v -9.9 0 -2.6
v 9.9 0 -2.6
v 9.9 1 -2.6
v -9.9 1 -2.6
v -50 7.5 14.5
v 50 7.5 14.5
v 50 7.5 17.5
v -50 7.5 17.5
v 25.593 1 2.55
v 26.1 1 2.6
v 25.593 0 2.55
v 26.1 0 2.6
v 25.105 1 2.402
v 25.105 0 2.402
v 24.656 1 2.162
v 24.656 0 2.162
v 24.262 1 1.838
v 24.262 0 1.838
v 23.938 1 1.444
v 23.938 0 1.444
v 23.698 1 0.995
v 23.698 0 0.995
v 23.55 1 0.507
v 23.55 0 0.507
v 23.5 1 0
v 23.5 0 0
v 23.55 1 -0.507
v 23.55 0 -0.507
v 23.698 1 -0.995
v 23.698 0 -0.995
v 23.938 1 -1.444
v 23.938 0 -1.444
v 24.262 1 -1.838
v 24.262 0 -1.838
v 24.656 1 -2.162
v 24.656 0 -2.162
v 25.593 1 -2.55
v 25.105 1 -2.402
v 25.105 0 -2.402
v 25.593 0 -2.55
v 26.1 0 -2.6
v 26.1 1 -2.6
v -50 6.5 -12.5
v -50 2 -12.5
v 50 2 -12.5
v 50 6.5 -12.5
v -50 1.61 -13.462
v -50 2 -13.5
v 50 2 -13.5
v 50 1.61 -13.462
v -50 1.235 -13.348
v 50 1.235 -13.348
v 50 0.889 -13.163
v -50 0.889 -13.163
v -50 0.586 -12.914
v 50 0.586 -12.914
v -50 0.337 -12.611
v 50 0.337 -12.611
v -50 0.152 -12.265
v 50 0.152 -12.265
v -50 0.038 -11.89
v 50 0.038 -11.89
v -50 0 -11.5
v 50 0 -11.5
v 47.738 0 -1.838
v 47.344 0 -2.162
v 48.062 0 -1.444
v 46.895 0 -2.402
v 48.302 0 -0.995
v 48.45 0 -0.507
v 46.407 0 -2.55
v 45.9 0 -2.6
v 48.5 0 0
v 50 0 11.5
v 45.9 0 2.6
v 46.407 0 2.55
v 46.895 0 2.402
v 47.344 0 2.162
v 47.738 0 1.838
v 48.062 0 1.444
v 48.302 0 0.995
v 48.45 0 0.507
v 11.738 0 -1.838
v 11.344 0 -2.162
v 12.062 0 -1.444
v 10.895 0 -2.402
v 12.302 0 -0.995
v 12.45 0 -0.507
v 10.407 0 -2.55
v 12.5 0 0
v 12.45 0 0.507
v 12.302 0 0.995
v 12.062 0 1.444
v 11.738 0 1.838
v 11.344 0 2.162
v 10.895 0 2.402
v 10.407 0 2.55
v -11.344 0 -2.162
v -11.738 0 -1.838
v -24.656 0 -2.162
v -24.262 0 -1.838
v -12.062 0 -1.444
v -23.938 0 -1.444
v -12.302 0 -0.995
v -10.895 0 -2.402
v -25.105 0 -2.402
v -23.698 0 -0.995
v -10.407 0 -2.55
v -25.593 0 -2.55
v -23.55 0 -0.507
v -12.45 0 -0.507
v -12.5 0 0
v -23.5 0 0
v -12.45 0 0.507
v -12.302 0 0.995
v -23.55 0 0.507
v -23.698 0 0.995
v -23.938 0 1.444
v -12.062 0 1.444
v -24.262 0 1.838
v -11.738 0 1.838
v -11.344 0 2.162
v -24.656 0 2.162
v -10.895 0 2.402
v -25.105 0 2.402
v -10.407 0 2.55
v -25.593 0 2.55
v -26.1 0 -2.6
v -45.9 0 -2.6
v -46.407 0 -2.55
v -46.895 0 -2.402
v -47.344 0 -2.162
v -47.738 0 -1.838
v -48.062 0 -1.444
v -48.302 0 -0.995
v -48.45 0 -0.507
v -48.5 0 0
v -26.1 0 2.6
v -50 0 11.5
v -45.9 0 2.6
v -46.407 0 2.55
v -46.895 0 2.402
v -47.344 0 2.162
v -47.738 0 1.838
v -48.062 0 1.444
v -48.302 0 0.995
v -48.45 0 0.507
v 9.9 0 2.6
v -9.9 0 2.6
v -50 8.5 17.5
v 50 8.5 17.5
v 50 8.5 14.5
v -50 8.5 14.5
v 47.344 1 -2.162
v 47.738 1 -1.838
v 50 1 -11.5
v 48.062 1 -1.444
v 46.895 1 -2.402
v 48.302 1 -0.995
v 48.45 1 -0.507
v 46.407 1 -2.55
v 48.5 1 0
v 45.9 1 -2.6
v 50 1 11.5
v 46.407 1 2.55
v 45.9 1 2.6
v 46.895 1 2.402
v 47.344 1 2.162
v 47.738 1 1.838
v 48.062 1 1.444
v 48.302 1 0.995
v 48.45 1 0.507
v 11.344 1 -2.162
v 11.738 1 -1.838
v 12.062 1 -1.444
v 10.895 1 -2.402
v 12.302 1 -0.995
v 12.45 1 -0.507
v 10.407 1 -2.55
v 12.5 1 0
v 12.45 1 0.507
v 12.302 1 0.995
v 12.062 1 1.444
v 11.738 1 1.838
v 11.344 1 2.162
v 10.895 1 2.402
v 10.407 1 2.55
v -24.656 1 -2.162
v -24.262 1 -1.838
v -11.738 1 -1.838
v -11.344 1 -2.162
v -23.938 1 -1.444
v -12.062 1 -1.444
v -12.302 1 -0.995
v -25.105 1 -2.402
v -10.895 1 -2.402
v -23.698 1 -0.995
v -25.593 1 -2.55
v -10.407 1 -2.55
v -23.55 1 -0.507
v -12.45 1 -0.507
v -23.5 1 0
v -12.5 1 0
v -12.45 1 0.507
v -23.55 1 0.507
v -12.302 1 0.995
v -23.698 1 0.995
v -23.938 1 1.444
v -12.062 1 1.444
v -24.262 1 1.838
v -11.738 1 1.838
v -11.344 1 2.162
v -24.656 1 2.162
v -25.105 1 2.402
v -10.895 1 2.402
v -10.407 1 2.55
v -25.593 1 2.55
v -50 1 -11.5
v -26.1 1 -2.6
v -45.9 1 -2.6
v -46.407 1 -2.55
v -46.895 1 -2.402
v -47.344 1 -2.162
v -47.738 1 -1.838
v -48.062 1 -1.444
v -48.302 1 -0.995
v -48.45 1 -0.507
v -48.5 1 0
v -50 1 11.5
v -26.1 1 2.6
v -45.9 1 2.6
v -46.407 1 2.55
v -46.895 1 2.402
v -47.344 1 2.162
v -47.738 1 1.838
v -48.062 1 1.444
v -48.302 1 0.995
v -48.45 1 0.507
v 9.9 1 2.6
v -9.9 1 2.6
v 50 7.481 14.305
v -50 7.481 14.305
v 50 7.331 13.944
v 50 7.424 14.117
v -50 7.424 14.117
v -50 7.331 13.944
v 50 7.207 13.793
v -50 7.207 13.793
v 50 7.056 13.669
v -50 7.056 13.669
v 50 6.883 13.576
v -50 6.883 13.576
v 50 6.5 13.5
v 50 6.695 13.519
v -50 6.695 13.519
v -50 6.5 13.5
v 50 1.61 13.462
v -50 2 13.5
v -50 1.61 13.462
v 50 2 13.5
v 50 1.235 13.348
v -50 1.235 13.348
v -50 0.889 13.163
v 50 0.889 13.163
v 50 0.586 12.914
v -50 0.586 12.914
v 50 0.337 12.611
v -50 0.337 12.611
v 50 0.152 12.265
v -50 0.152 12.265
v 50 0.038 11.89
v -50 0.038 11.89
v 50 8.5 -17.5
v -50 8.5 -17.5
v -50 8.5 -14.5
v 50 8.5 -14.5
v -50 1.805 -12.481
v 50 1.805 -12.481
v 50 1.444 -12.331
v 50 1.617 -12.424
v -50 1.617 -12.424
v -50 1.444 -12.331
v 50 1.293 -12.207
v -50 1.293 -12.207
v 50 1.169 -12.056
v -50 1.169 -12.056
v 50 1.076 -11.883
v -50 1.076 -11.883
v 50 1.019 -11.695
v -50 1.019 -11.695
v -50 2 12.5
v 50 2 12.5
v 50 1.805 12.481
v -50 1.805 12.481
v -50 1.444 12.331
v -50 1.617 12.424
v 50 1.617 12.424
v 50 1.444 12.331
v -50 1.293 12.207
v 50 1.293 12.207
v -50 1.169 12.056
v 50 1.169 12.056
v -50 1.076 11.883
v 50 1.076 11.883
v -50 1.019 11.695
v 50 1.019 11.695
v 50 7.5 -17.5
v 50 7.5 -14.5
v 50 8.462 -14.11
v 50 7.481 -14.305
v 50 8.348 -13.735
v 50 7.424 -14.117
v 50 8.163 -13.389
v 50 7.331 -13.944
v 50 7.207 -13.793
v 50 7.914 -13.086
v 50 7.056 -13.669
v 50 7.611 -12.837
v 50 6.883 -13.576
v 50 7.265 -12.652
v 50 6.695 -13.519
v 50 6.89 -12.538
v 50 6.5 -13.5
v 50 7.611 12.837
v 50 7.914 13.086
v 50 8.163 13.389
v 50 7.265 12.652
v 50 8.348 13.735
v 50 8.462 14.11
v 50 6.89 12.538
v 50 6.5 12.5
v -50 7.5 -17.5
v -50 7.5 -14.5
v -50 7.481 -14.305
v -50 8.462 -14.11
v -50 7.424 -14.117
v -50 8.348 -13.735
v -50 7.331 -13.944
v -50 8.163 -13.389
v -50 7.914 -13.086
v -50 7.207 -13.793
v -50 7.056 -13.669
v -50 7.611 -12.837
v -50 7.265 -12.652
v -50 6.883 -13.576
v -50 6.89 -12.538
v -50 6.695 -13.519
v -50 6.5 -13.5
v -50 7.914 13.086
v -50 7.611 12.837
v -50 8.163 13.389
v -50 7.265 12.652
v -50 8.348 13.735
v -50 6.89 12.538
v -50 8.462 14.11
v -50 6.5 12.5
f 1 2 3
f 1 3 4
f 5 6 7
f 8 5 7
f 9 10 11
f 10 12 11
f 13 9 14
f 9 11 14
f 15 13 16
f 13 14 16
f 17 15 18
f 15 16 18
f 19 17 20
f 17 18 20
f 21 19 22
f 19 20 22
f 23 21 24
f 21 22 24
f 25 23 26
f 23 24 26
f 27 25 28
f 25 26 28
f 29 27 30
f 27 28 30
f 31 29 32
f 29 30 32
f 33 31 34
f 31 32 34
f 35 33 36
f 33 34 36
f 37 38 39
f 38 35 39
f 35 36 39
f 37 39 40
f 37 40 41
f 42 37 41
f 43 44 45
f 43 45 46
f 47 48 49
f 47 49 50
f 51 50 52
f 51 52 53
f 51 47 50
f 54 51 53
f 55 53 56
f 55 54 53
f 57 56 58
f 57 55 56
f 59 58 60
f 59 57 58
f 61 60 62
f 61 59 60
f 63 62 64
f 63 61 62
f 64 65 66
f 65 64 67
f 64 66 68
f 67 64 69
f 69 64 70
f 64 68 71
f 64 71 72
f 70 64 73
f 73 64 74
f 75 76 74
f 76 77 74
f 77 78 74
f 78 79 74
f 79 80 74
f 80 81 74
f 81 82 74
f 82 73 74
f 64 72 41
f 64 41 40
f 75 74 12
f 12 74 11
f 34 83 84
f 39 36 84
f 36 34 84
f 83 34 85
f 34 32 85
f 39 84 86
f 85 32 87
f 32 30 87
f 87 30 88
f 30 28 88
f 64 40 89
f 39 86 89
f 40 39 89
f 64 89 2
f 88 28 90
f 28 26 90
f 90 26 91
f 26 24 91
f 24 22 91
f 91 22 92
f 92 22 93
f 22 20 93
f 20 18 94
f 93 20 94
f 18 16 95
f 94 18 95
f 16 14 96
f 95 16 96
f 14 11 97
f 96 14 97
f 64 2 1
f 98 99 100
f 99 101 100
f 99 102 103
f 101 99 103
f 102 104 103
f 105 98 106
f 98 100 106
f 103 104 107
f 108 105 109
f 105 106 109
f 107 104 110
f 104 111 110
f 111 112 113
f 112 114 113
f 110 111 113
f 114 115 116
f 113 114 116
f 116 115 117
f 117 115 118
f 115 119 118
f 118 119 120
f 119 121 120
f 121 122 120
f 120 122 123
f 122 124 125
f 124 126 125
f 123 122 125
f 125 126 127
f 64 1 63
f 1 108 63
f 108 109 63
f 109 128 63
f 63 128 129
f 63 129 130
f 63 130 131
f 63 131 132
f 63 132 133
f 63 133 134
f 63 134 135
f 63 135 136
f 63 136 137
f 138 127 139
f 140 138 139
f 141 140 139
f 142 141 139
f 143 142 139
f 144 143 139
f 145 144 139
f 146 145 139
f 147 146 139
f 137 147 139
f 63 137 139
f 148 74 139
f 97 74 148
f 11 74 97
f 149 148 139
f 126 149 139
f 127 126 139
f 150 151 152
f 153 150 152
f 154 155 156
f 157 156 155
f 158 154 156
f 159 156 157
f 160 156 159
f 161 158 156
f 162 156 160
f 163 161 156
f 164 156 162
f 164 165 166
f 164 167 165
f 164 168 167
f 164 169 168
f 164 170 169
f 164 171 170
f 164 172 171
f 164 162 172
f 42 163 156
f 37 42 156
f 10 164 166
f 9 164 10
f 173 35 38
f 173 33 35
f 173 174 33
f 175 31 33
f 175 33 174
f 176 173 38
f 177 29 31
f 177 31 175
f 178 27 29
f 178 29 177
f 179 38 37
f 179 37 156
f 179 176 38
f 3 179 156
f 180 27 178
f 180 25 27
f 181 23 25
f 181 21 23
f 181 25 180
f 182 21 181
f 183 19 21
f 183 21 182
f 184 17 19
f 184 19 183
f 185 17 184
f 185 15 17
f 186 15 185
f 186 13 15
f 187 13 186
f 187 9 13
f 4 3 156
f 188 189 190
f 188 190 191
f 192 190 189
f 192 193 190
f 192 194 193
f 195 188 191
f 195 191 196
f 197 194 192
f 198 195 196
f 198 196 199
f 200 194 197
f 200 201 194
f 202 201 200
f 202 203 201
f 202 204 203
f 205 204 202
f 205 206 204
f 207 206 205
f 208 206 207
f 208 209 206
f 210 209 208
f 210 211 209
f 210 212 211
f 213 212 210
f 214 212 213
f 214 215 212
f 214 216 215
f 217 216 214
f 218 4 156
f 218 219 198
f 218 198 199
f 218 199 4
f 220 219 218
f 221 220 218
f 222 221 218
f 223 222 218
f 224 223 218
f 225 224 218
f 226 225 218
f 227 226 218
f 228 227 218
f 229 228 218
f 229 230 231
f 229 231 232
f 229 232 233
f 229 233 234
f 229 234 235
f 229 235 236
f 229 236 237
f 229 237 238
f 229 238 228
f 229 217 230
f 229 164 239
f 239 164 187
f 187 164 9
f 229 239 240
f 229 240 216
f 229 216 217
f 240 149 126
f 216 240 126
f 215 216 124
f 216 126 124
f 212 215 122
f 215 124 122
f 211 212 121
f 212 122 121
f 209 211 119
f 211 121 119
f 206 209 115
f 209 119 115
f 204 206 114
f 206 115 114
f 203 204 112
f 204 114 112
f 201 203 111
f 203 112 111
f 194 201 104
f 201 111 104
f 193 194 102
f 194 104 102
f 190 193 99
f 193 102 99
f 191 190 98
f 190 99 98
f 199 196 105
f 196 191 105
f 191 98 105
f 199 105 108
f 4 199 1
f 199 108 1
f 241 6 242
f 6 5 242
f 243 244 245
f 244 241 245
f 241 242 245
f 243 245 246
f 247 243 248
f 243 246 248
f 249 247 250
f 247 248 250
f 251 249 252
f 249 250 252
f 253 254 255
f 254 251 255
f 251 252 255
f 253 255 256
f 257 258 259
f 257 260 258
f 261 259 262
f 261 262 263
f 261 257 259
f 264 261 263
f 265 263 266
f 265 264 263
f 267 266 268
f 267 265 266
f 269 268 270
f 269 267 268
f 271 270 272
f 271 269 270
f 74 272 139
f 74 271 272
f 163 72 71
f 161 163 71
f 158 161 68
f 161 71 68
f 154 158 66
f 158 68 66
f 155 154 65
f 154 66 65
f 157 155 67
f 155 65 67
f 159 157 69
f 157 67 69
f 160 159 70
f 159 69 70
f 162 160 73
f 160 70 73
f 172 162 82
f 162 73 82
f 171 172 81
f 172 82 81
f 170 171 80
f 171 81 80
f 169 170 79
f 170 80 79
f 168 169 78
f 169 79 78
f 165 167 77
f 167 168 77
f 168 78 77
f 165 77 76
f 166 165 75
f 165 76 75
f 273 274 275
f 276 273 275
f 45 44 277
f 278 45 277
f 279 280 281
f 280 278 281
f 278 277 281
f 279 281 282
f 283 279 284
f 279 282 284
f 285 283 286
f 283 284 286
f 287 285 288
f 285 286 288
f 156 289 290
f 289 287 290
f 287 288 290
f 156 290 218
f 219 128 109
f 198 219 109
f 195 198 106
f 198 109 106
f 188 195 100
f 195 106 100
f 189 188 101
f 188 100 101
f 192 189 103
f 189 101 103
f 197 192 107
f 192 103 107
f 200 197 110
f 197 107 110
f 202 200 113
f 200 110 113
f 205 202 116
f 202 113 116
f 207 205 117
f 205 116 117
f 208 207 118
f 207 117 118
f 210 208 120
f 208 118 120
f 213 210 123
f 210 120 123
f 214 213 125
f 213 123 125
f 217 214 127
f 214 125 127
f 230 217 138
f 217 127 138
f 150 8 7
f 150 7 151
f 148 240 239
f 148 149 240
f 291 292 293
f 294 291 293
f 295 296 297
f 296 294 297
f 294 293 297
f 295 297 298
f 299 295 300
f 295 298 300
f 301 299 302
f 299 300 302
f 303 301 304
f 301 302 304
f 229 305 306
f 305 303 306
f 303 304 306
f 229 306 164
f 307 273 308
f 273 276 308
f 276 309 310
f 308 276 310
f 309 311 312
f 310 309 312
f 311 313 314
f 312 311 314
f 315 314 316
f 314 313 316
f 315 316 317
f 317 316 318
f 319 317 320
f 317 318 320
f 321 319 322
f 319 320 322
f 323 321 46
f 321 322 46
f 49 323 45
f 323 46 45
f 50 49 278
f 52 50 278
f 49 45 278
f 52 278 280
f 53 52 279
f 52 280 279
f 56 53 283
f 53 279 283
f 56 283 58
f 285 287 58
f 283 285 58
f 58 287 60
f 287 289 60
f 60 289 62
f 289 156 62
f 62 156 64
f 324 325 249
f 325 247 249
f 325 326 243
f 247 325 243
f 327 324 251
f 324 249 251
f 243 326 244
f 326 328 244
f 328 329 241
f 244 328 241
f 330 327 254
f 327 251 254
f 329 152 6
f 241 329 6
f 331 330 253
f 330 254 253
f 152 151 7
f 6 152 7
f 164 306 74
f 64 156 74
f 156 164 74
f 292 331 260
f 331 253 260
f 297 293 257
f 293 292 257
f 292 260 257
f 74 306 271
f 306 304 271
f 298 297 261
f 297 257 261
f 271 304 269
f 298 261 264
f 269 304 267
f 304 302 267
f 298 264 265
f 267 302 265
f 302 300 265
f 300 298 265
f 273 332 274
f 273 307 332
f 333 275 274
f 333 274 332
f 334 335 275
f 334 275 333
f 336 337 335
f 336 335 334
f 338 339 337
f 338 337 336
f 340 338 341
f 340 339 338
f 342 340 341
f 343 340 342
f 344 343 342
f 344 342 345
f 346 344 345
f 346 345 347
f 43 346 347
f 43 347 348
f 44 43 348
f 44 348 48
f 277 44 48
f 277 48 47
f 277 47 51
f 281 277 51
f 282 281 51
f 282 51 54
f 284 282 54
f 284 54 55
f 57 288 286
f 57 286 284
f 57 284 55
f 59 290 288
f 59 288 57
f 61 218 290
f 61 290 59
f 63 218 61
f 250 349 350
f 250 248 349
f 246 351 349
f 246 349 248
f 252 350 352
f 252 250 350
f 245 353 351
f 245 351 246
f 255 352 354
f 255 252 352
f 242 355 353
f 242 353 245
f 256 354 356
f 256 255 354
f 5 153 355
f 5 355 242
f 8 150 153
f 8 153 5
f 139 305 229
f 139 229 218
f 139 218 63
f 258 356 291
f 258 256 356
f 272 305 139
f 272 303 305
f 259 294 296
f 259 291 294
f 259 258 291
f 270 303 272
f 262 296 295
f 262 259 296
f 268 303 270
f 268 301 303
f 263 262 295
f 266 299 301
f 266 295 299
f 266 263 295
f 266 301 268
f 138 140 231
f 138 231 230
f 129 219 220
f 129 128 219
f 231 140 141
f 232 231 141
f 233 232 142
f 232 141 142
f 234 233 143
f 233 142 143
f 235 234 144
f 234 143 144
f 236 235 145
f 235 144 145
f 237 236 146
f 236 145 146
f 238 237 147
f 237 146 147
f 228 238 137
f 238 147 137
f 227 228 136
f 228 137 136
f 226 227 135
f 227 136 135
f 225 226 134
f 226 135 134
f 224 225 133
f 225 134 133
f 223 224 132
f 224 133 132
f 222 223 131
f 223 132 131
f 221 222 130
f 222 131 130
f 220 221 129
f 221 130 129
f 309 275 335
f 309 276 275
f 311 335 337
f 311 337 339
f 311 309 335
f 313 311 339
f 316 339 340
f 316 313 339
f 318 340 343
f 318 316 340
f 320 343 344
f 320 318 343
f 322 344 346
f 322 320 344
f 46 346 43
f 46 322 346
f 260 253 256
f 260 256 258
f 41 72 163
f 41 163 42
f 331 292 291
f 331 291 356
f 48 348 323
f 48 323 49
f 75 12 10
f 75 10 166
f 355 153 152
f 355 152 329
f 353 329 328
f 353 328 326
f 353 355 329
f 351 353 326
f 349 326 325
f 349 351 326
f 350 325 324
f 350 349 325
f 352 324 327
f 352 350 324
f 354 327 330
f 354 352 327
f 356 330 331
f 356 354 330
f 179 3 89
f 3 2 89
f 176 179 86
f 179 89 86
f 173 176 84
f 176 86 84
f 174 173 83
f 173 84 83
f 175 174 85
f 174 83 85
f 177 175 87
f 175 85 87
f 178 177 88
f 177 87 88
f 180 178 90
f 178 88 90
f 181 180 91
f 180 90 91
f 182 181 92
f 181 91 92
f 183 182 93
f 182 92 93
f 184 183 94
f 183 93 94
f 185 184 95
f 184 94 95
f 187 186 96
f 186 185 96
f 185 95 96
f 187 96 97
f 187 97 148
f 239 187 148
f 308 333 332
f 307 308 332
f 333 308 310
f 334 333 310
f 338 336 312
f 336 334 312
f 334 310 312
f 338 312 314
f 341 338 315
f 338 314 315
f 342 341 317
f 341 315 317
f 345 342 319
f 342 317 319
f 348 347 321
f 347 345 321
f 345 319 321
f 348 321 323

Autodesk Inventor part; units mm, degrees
ref_plane "YZ Plane" through (0, 0, 0) normal (1, 0, 0) x (0, 1, 0)
ref_plane "XZ Plane" through (0, 0, 0) normal (0, 1, 0) x (-1, 0, 0)
ref_plane "XY Plane" through (0, 0, 0) normal (0, 0, 1) x (1, 0, 0)
sketch "Base Pattern" plane through (0, 0, 0) normal (0, 1, 0) x (-1, 0, 0)
  line L0 (50, 13.5) -> (-50, 13.5)
  line L1 (-50, 13.5) -> (-50, -13.5)
  line L2 (-50, -13.5) -> (50, -13.5)
  line L3 (50, -13.5) -> (50, 13.5)
  line L4 (50, 13.5) -> (-50, -13.5) construction
  line L5 (-50, 13.5) -> (50, -13.5) construction
  point P0 (0, 0)
  dimension "Length" = 100
  dimension "Base_Width" = 27
sketch "Slot Pattern Set-Out" plane through (0, 0, 0) normal (0, 1, 0) x (-1, 0, 0)
  line L0 (0, -25) -> (0, 25)
  line L1 (9.9, 2.6) -> (-9.9, 2.6)
  line L2 (-9.9, -2.6) -> (9.9, -2.6)
  arc A0 (9.9, -2.6) -> (9.9, 2.6) centre (9.9, 0) ccw
  arc A1 (-9.9, 2.6) -> (-9.9, -2.6) centre (-9.9, 0) ccw
  line L3 (32, 0) -> (-32, 0) construction
  line L4 (9.9, 0) -> (-9.9, 0) construction
  point P0 (0, 0)
  point P1 (0, 0)
  point P2 (0, 0)
  point P3 (0, 0)
  dimension "Slot_Length" = 19.8
  dimension "Slot_Dia" = 5.2
  dimension "Pattern_Length" = 64
extrude "Plate1" add sketch "Base Pattern" along normal blind 1
sketch "Sketch3" plane through (-50, 0, -12.5) normal (0, 0, -1) x (-1, 0, 0)
  line L0 (-100, 0) -> (0, 0)
  line L1 (0, 0) -> (0, 7.5)
  line L2 (0, 7.5) -> (-100, 7.5)
  line L3 (-100, 7.5) -> (-100, 0)
edge flange "Flange Side" height 7.5 angle 90 thickness 1 bend radius 1 thickness toward (0, 0, -1) relief tear relief width 1 relief depth 0.5 corner gap 1 corner form 0 edges at (0, 1, -13.5) (0, 1, 13.5) wall of the first edge with corners at (50, 0, -12.5) (-50, 0, -12.5) (-50, 7.5, -12.5) (50, 7.5, -12.5)
bend "Bend1"
corner "Corner1"
sketch "Sketch4" plane through (-50, 7.5, 13.5) normal (0, 1, 0) x (-1, 0, 0)
  line L0 (-100, 0) -> (0, 0)
  line L1 (0, 0) -> (0, 4)
  line L2 (0, 4) -> (-100, 4)
  line L3 (-100, 4) -> (-100, 0)
edge flange "Flange Nib" height 5 angle 90 thickness 1 bend radius 1 thickness toward (0, 1, 0) relief tear relief width 1 relief depth 0.5 corner gap 1 corner form 0 edges at (0, 7.5, 13.5) (0, 7.5, -13.5) wall of the first edge with corners at (50, 7.5, 13.5) (-50, 7.5, 13.5) (-50, 7.5, 17.5) (50, 7.5, 17.5)
bend "Bend2"
corner "Corner2"
extrude "Slot Cut-Out" cut sketch "Slot Pattern Set-Out" along normal blind 1
pattern_linear "Slot Pattern" count 2 spacing 36 along (1, 0, 0) of "Slot Cut-Out"
mirror "Slot Patern Mirror" about plane through (0, 0, 0) normal (1, 0, 0) of "Slot Cut-Out", "Slot Pattern"
equation "\"Slot_Length\" = Slot_Length_Effective"
equation "\"d28\" = Thickness"
equation "\"d30\" = 0.6 * Slots_Integer"
equation "\"d32\" = Slot_Spacing"
equation "\"d8\" = BendReliefWidth"
equation "\"d9\" = BendReliefDepth"
equation "\"d10\" = MinimumRemnant"
equation "\"d11\" = BendRadius"
equation "\"d12\" = Flange_Height"
equation "\"d14\" = BendRadius"
equation "\"d15\" = CornerReliefSize"
equation "\"d16\" = GapSize"
equation "\"d17\" = JacobiRadiusSize"
equation "\"d18\" = BendReliefWidth"
equation "\"d19\" = BendReliefDepth"
equation "\"d20\" = MinimumRemnant"
equation "\"d21\" = BendRadius"
equation "\"d22\" = Flange_Nib"
equation "\"d24\" = BendRadius"
equation "\"d25\" = CornerReliefSize"
equation "\"d26\" = GapSize"
equation "\"d27\" = JacobiRadiusSize"
equation "\"BendRadius\" = Thickness"
equation "\"BendReliefWidth\" = Thickness"
equation "\"BendReliefDepth\" = 0.5 * Thickness"
equation "\"CornerReliefSize\" = 4 * Thickness"
equation "\"MinimumRemnant\" = 2 * Thickness"
equation "\"TransitionRadius\" = BendRadius"
equation "\"JacobiRadiusSize\" = BendRadius"
equation "\"GapSize\" = Thickness"
equation "\"Flange_Height\" = 7.5"
equation "\"Slot_Spacing\" = 36"
equation "\"Flange_Nib\" = 5"
equation "\"Slot_Length_Tab\" = 25"
equation "\"Slot_Length_Effective\" = Slot_Length_Tab - Slot_Dia"
equation "\"Thickness\" = 1"
equation "\"Slots_Integer\" = 2.777778"
properties part number "DIN Rail (TS) 35mm Wide v1-01" material "Steel"
